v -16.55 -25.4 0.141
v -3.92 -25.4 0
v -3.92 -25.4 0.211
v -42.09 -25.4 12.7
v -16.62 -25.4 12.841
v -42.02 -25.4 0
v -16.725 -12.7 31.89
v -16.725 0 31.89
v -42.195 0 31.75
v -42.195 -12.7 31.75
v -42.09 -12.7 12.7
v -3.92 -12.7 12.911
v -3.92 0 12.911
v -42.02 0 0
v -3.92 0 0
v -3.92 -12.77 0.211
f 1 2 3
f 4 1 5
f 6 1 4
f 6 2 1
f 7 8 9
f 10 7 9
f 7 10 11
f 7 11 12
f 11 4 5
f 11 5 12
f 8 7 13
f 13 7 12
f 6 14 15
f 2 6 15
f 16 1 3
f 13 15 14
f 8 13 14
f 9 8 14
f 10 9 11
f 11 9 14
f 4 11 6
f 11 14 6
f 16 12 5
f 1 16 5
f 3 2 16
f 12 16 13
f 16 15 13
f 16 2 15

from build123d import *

# Parameters (mm, degrees)
F1_DEPTH = 25.4
F2_DEPTH = 19.05
F4_DEPTH = 12.7
F6_DEPTH = 12.701
F8_DEPTH = 12.7


with BuildPart() as f1:
    # F0 (on Front) → F1 (new body)
    with BuildSketch(Plane.XZ):
        Polygon((-42.0901787708, 12.7), (-42.0200370051, 0), (-3.9200370051, 0), (-3.9200370051, 12.9108126882), align=None)
    extrude(amount=F1_DEPTH)

    # F2 (add): a face of the model
    f2_faces = [f1.faces().sort_by_distance(p)[0] for p in [
        (-23.005107888, -12.7, 12.8054063441),
    ]]
    extrude(f2_faces, amount=F2_DEPTH)

    # F3 (on face) → F4 (cut)
    with BuildSketch(Plane.XZ.offset(25.4)):
        Polygon((-42.0901787708, 12.7), (-3.9200370051, 12.9108126882), (-4.025248049, 31.9605221515), (-42.1953898147, 31.7497094633), align=None)
    extrude(amount=-F4_DEPTH, mode=Mode.SUBTRACT)

    # F5 (on face) → F6 (cut, through all)
    with BuildSketch(Plane.XZ.offset(12.7)):
        Polygon((-4.025248049, 31.9605221515), (-16.7250543579, 31.8903814555), (-3.9200370051, 12.9108126882), align=None)
    extrude(amount=-F6_DEPTH, mode=Mode.SUBTRACT)

    # F7 (on face) → F8 (cut)
    with BuildSketch(Plane(origin=(-0.0714234738, 0, 12.9320684794), x_dir=(0.9999847487, 0, 0.0055228894), z_dir=(-0.0055228894, 0, 0.9999847487))):
        Polygon((-3.8486722285, -12.7), (-16.5486722285, -25.4), (-3.8486722285, -25.4), align=None)
    extrude(amount=-F8_DEPTH, mode=Mode.SUBTRACT)


solid = f1.part
